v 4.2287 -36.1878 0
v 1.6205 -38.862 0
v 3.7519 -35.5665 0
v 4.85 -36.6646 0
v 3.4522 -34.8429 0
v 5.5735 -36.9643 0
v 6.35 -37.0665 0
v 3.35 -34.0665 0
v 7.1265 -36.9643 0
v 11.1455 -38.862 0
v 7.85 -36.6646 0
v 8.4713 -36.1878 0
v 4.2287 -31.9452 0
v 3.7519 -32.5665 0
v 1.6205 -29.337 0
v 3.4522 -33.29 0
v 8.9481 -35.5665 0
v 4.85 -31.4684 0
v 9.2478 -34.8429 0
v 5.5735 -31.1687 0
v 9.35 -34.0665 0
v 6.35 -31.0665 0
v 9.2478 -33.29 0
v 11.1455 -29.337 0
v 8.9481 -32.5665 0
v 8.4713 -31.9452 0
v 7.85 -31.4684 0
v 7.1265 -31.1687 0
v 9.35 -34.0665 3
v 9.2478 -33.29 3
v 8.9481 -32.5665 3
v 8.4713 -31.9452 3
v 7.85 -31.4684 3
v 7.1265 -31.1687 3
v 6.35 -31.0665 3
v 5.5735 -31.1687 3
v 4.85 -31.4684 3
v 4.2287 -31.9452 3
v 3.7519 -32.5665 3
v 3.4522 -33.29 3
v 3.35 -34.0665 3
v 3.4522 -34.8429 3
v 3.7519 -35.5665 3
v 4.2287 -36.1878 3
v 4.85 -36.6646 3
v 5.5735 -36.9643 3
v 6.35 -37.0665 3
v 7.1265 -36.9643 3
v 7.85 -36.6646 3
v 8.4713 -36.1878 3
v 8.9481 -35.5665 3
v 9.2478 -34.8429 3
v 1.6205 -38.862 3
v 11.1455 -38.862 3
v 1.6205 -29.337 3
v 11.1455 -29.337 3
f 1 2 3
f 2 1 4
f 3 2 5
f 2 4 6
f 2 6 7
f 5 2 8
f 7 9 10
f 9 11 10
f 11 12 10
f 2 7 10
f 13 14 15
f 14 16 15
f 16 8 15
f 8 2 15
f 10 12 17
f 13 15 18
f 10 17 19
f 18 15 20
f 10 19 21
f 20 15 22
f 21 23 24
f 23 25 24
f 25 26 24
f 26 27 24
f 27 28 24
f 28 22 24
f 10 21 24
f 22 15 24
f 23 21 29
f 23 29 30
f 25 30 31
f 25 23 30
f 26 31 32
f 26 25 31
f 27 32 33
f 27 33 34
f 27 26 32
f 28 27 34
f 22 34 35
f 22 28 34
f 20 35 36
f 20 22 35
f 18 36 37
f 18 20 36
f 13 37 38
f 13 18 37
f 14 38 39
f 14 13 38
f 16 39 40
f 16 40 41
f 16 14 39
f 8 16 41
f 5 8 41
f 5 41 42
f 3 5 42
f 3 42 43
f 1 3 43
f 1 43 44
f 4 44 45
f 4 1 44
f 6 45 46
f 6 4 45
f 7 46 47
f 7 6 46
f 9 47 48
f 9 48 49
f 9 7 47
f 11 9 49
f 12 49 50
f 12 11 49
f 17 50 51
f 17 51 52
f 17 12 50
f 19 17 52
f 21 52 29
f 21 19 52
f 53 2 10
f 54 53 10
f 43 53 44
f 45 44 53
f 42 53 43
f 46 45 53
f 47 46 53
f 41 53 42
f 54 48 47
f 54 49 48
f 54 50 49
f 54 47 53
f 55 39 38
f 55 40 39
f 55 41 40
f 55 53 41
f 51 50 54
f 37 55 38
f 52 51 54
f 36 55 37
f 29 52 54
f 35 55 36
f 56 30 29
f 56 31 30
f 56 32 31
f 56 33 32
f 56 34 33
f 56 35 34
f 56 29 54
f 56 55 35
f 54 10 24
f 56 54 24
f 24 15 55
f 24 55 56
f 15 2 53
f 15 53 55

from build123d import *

# Parameters (mm, degrees)
CYLINDER034_R     = 3
CYLINDER034_DEPTH = 3
BOX013_W          = 9.525
BOX013_H          = 9.525
BOX013_DEPTH      = 3


with BuildPart() as cylinder034:
    # Cylinder034 → Cylinder034 (new body)
    with BuildSketch(Plane(origin=(6.35, 6.35, 0), x_dir=(1, 0, 0), z_dir=(0, 0, 1))):
        Circle(CYLINDER034_R)
    extrude(amount=CYLINDER034_DEPTH)


with BuildPart() as m6_nut:
    # Box013 → Box013 (new body)
    with BuildSketch(Plane(origin=(1.62052, 1.55448, 0), x_dir=(1, 0, 0), z_dir=(0, 0, 1))):
        with Locations((4.7625, 4.7625)):
            Rectangle(BOX013_W, BOX013_H)
    extrude(amount=BOX013_DEPTH)

    # Cut011: cut Cylinder034
    add(cylinder034.part, mode=Mode.SUBTRACT)


with BuildPart() as m6_nut_1:
    # Cut011 placement: moved
    add(m6_nut.part.moved(Location((0, -40.41648, 0))))


solid = m6_nut_1.part
